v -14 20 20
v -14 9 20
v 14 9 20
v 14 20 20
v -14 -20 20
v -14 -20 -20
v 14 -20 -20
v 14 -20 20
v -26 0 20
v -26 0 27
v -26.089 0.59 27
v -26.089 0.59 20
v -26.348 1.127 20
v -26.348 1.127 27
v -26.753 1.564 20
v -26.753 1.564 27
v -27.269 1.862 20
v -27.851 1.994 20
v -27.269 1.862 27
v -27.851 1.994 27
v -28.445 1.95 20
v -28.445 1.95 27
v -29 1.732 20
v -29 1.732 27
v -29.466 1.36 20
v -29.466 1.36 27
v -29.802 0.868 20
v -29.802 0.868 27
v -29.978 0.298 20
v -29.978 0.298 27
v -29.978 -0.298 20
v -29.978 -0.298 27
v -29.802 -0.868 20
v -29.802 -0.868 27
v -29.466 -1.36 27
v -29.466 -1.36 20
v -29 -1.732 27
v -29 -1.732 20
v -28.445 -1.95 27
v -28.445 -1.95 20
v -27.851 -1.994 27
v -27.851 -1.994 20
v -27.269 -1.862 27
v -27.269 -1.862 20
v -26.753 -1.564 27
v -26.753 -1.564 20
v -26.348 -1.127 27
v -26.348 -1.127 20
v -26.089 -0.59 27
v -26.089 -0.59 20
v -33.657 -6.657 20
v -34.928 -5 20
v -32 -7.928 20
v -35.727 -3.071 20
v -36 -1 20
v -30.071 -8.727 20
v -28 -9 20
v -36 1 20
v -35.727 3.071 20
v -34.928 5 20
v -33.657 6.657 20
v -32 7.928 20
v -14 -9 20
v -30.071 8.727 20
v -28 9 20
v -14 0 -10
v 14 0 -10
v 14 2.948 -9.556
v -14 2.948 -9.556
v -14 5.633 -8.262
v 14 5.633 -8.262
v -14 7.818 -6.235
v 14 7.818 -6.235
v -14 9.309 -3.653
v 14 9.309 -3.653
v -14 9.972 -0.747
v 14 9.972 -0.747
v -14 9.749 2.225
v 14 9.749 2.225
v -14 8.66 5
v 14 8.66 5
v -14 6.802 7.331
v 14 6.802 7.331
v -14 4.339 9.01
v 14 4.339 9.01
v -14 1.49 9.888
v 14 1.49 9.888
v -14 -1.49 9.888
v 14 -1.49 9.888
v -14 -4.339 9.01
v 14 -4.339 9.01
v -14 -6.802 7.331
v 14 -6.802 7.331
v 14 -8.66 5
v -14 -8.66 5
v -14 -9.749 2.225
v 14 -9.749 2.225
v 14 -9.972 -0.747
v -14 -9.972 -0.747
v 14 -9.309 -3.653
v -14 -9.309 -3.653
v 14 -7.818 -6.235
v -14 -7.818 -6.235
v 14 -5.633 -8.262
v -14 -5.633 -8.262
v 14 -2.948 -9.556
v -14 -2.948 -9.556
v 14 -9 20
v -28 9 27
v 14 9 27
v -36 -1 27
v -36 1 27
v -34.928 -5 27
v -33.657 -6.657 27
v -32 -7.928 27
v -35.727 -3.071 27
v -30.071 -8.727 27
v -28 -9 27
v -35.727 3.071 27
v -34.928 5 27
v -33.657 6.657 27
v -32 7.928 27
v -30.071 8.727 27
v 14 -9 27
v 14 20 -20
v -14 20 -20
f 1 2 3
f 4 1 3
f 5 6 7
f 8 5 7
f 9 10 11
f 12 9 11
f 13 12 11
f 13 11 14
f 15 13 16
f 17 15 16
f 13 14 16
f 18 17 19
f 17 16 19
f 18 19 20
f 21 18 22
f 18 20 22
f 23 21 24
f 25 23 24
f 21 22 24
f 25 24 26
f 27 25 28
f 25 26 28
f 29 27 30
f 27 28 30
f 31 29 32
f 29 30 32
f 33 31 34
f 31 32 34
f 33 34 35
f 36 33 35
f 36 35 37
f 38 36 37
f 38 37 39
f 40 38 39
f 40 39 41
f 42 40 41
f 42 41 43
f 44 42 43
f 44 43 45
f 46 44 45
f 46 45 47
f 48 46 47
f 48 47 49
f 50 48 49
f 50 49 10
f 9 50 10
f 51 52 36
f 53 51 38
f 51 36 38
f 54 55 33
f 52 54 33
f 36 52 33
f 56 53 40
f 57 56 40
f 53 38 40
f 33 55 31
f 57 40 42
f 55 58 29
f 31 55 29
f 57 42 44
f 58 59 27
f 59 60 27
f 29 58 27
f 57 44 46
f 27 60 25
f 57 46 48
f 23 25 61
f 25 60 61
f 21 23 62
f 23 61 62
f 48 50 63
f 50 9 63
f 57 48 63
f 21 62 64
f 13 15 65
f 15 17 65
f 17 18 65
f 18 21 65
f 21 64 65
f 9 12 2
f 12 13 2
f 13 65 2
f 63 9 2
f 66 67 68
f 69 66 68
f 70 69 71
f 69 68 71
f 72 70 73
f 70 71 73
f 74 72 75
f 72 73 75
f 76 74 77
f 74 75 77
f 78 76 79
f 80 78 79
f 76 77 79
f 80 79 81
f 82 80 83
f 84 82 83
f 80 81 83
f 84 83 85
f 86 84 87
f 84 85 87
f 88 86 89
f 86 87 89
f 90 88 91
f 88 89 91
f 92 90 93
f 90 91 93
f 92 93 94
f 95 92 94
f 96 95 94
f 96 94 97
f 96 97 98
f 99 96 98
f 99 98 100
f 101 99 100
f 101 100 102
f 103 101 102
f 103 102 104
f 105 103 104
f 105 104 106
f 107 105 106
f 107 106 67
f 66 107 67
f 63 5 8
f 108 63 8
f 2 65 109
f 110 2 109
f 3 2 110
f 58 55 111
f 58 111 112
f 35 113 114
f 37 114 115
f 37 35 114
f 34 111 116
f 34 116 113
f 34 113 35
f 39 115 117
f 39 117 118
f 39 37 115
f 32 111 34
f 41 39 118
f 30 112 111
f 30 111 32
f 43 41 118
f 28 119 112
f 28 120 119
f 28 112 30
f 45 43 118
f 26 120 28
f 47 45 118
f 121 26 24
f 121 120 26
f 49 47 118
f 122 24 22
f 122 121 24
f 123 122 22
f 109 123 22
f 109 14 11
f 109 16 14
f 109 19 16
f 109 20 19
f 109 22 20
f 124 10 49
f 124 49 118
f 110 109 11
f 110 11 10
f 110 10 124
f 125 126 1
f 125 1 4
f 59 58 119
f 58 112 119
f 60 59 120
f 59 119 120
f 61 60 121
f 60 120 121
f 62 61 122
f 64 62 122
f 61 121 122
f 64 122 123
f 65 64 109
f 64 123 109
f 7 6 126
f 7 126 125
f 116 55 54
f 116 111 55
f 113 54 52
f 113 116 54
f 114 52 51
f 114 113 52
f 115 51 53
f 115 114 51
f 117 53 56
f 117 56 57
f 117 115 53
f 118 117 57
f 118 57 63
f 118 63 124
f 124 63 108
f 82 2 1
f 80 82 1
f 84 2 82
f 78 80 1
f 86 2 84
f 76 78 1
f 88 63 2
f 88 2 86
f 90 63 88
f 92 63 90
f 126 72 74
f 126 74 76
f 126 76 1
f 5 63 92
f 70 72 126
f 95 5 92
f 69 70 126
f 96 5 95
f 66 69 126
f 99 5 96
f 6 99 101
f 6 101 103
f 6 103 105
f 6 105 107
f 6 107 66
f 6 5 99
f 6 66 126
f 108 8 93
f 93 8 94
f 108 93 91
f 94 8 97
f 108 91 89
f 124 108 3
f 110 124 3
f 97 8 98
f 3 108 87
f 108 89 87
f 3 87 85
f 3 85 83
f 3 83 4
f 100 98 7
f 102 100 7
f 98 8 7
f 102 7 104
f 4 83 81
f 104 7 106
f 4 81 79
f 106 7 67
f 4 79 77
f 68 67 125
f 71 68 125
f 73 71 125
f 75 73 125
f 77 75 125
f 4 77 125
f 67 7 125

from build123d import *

# Parameters (mm, degrees)
AUFSATZ_LINEAR_AUSTRAGEN1_DEPTH      = 20
AUFSATZ_LINEAR_AUSTRAGEN1_DEPTH_BACK = 20
SKIZZE1_W                            = 28
SKIZZE1_H                            = 40
SKIZZE2_R                            = 10
SCHNITT_LINEAR_AUSTRAGEN1_DEPTH      = 40.799497484
SKIZZE3_W                            = 50
SKIZZE3_H                            = 18
AUFSATZ_LINEAR_AUSTRAGEN2_DEPTH      = 7
SKIZZE5_R                            = 2
SCHNITT_LINEAR_AUSTRAGEN2_DEPTH      = 63.4899992
VERRUNDUNG1_R                        = 8


with BuildPart() as part:
    # Skizze1 → Aufsatz-Linear austragen1 (new, two sides: drawn at the far end of the back side and taken through both)
    with BuildSketch(Plane(origin=(0, 0, 0), x_dir=(1, 0, 0), z_dir=(0, 1, 0)).offset(-AUFSATZ_LINEAR_AUSTRAGEN1_DEPTH_BACK)):
        Rectangle(SKIZZE1_W, SKIZZE1_H)
    extrude(amount=AUFSATZ_LINEAR_AUSTRAGEN1_DEPTH + AUFSATZ_LINEAR_AUSTRAGEN1_DEPTH_BACK)

    # Skizze2 → Schnitt-Linear austragen1 (cut, through all)
    with BuildSketch(Plane(origin=(14, 0, 0), x_dir=(0, 0, -1), z_dir=(1, 0, 0))):
        Circle(SKIZZE2_R)
    extrude(amount=-SCHNITT_LINEAR_AUSTRAGEN1_DEPTH, mode=Mode.SUBTRACT)

    # Skizze3 → Aufsatz-Linear austragen2 (add)
    with BuildSketch(Plane.XY.offset(20)):
        with Locations((-11, 0)):
            Rectangle(SKIZZE3_W, SKIZZE3_H)
    extrude(amount=AUFSATZ_LINEAR_AUSTRAGEN2_DEPTH)

    # Skizze5 → Schnitt-Linear austragen2 (cut, through all)
    with BuildSketch(Plane.XY.offset(27)):
        with Locations((-28, 0)):
            Circle(SKIZZE5_R)
    extrude(amount=-SCHNITT_LINEAR_AUSTRAGEN2_DEPTH, mode=Mode.SUBTRACT)

    # Verrundung1
    verrundung1_edges = [part.edges().sort_by_distance(p)[0] for p in [
        (-36, 9, 23.5),
        (-36, -9, 23.5),
    ]]
    fillet(verrundung1_edges, radius=VERRUNDUNG1_R)


solid = part.part
